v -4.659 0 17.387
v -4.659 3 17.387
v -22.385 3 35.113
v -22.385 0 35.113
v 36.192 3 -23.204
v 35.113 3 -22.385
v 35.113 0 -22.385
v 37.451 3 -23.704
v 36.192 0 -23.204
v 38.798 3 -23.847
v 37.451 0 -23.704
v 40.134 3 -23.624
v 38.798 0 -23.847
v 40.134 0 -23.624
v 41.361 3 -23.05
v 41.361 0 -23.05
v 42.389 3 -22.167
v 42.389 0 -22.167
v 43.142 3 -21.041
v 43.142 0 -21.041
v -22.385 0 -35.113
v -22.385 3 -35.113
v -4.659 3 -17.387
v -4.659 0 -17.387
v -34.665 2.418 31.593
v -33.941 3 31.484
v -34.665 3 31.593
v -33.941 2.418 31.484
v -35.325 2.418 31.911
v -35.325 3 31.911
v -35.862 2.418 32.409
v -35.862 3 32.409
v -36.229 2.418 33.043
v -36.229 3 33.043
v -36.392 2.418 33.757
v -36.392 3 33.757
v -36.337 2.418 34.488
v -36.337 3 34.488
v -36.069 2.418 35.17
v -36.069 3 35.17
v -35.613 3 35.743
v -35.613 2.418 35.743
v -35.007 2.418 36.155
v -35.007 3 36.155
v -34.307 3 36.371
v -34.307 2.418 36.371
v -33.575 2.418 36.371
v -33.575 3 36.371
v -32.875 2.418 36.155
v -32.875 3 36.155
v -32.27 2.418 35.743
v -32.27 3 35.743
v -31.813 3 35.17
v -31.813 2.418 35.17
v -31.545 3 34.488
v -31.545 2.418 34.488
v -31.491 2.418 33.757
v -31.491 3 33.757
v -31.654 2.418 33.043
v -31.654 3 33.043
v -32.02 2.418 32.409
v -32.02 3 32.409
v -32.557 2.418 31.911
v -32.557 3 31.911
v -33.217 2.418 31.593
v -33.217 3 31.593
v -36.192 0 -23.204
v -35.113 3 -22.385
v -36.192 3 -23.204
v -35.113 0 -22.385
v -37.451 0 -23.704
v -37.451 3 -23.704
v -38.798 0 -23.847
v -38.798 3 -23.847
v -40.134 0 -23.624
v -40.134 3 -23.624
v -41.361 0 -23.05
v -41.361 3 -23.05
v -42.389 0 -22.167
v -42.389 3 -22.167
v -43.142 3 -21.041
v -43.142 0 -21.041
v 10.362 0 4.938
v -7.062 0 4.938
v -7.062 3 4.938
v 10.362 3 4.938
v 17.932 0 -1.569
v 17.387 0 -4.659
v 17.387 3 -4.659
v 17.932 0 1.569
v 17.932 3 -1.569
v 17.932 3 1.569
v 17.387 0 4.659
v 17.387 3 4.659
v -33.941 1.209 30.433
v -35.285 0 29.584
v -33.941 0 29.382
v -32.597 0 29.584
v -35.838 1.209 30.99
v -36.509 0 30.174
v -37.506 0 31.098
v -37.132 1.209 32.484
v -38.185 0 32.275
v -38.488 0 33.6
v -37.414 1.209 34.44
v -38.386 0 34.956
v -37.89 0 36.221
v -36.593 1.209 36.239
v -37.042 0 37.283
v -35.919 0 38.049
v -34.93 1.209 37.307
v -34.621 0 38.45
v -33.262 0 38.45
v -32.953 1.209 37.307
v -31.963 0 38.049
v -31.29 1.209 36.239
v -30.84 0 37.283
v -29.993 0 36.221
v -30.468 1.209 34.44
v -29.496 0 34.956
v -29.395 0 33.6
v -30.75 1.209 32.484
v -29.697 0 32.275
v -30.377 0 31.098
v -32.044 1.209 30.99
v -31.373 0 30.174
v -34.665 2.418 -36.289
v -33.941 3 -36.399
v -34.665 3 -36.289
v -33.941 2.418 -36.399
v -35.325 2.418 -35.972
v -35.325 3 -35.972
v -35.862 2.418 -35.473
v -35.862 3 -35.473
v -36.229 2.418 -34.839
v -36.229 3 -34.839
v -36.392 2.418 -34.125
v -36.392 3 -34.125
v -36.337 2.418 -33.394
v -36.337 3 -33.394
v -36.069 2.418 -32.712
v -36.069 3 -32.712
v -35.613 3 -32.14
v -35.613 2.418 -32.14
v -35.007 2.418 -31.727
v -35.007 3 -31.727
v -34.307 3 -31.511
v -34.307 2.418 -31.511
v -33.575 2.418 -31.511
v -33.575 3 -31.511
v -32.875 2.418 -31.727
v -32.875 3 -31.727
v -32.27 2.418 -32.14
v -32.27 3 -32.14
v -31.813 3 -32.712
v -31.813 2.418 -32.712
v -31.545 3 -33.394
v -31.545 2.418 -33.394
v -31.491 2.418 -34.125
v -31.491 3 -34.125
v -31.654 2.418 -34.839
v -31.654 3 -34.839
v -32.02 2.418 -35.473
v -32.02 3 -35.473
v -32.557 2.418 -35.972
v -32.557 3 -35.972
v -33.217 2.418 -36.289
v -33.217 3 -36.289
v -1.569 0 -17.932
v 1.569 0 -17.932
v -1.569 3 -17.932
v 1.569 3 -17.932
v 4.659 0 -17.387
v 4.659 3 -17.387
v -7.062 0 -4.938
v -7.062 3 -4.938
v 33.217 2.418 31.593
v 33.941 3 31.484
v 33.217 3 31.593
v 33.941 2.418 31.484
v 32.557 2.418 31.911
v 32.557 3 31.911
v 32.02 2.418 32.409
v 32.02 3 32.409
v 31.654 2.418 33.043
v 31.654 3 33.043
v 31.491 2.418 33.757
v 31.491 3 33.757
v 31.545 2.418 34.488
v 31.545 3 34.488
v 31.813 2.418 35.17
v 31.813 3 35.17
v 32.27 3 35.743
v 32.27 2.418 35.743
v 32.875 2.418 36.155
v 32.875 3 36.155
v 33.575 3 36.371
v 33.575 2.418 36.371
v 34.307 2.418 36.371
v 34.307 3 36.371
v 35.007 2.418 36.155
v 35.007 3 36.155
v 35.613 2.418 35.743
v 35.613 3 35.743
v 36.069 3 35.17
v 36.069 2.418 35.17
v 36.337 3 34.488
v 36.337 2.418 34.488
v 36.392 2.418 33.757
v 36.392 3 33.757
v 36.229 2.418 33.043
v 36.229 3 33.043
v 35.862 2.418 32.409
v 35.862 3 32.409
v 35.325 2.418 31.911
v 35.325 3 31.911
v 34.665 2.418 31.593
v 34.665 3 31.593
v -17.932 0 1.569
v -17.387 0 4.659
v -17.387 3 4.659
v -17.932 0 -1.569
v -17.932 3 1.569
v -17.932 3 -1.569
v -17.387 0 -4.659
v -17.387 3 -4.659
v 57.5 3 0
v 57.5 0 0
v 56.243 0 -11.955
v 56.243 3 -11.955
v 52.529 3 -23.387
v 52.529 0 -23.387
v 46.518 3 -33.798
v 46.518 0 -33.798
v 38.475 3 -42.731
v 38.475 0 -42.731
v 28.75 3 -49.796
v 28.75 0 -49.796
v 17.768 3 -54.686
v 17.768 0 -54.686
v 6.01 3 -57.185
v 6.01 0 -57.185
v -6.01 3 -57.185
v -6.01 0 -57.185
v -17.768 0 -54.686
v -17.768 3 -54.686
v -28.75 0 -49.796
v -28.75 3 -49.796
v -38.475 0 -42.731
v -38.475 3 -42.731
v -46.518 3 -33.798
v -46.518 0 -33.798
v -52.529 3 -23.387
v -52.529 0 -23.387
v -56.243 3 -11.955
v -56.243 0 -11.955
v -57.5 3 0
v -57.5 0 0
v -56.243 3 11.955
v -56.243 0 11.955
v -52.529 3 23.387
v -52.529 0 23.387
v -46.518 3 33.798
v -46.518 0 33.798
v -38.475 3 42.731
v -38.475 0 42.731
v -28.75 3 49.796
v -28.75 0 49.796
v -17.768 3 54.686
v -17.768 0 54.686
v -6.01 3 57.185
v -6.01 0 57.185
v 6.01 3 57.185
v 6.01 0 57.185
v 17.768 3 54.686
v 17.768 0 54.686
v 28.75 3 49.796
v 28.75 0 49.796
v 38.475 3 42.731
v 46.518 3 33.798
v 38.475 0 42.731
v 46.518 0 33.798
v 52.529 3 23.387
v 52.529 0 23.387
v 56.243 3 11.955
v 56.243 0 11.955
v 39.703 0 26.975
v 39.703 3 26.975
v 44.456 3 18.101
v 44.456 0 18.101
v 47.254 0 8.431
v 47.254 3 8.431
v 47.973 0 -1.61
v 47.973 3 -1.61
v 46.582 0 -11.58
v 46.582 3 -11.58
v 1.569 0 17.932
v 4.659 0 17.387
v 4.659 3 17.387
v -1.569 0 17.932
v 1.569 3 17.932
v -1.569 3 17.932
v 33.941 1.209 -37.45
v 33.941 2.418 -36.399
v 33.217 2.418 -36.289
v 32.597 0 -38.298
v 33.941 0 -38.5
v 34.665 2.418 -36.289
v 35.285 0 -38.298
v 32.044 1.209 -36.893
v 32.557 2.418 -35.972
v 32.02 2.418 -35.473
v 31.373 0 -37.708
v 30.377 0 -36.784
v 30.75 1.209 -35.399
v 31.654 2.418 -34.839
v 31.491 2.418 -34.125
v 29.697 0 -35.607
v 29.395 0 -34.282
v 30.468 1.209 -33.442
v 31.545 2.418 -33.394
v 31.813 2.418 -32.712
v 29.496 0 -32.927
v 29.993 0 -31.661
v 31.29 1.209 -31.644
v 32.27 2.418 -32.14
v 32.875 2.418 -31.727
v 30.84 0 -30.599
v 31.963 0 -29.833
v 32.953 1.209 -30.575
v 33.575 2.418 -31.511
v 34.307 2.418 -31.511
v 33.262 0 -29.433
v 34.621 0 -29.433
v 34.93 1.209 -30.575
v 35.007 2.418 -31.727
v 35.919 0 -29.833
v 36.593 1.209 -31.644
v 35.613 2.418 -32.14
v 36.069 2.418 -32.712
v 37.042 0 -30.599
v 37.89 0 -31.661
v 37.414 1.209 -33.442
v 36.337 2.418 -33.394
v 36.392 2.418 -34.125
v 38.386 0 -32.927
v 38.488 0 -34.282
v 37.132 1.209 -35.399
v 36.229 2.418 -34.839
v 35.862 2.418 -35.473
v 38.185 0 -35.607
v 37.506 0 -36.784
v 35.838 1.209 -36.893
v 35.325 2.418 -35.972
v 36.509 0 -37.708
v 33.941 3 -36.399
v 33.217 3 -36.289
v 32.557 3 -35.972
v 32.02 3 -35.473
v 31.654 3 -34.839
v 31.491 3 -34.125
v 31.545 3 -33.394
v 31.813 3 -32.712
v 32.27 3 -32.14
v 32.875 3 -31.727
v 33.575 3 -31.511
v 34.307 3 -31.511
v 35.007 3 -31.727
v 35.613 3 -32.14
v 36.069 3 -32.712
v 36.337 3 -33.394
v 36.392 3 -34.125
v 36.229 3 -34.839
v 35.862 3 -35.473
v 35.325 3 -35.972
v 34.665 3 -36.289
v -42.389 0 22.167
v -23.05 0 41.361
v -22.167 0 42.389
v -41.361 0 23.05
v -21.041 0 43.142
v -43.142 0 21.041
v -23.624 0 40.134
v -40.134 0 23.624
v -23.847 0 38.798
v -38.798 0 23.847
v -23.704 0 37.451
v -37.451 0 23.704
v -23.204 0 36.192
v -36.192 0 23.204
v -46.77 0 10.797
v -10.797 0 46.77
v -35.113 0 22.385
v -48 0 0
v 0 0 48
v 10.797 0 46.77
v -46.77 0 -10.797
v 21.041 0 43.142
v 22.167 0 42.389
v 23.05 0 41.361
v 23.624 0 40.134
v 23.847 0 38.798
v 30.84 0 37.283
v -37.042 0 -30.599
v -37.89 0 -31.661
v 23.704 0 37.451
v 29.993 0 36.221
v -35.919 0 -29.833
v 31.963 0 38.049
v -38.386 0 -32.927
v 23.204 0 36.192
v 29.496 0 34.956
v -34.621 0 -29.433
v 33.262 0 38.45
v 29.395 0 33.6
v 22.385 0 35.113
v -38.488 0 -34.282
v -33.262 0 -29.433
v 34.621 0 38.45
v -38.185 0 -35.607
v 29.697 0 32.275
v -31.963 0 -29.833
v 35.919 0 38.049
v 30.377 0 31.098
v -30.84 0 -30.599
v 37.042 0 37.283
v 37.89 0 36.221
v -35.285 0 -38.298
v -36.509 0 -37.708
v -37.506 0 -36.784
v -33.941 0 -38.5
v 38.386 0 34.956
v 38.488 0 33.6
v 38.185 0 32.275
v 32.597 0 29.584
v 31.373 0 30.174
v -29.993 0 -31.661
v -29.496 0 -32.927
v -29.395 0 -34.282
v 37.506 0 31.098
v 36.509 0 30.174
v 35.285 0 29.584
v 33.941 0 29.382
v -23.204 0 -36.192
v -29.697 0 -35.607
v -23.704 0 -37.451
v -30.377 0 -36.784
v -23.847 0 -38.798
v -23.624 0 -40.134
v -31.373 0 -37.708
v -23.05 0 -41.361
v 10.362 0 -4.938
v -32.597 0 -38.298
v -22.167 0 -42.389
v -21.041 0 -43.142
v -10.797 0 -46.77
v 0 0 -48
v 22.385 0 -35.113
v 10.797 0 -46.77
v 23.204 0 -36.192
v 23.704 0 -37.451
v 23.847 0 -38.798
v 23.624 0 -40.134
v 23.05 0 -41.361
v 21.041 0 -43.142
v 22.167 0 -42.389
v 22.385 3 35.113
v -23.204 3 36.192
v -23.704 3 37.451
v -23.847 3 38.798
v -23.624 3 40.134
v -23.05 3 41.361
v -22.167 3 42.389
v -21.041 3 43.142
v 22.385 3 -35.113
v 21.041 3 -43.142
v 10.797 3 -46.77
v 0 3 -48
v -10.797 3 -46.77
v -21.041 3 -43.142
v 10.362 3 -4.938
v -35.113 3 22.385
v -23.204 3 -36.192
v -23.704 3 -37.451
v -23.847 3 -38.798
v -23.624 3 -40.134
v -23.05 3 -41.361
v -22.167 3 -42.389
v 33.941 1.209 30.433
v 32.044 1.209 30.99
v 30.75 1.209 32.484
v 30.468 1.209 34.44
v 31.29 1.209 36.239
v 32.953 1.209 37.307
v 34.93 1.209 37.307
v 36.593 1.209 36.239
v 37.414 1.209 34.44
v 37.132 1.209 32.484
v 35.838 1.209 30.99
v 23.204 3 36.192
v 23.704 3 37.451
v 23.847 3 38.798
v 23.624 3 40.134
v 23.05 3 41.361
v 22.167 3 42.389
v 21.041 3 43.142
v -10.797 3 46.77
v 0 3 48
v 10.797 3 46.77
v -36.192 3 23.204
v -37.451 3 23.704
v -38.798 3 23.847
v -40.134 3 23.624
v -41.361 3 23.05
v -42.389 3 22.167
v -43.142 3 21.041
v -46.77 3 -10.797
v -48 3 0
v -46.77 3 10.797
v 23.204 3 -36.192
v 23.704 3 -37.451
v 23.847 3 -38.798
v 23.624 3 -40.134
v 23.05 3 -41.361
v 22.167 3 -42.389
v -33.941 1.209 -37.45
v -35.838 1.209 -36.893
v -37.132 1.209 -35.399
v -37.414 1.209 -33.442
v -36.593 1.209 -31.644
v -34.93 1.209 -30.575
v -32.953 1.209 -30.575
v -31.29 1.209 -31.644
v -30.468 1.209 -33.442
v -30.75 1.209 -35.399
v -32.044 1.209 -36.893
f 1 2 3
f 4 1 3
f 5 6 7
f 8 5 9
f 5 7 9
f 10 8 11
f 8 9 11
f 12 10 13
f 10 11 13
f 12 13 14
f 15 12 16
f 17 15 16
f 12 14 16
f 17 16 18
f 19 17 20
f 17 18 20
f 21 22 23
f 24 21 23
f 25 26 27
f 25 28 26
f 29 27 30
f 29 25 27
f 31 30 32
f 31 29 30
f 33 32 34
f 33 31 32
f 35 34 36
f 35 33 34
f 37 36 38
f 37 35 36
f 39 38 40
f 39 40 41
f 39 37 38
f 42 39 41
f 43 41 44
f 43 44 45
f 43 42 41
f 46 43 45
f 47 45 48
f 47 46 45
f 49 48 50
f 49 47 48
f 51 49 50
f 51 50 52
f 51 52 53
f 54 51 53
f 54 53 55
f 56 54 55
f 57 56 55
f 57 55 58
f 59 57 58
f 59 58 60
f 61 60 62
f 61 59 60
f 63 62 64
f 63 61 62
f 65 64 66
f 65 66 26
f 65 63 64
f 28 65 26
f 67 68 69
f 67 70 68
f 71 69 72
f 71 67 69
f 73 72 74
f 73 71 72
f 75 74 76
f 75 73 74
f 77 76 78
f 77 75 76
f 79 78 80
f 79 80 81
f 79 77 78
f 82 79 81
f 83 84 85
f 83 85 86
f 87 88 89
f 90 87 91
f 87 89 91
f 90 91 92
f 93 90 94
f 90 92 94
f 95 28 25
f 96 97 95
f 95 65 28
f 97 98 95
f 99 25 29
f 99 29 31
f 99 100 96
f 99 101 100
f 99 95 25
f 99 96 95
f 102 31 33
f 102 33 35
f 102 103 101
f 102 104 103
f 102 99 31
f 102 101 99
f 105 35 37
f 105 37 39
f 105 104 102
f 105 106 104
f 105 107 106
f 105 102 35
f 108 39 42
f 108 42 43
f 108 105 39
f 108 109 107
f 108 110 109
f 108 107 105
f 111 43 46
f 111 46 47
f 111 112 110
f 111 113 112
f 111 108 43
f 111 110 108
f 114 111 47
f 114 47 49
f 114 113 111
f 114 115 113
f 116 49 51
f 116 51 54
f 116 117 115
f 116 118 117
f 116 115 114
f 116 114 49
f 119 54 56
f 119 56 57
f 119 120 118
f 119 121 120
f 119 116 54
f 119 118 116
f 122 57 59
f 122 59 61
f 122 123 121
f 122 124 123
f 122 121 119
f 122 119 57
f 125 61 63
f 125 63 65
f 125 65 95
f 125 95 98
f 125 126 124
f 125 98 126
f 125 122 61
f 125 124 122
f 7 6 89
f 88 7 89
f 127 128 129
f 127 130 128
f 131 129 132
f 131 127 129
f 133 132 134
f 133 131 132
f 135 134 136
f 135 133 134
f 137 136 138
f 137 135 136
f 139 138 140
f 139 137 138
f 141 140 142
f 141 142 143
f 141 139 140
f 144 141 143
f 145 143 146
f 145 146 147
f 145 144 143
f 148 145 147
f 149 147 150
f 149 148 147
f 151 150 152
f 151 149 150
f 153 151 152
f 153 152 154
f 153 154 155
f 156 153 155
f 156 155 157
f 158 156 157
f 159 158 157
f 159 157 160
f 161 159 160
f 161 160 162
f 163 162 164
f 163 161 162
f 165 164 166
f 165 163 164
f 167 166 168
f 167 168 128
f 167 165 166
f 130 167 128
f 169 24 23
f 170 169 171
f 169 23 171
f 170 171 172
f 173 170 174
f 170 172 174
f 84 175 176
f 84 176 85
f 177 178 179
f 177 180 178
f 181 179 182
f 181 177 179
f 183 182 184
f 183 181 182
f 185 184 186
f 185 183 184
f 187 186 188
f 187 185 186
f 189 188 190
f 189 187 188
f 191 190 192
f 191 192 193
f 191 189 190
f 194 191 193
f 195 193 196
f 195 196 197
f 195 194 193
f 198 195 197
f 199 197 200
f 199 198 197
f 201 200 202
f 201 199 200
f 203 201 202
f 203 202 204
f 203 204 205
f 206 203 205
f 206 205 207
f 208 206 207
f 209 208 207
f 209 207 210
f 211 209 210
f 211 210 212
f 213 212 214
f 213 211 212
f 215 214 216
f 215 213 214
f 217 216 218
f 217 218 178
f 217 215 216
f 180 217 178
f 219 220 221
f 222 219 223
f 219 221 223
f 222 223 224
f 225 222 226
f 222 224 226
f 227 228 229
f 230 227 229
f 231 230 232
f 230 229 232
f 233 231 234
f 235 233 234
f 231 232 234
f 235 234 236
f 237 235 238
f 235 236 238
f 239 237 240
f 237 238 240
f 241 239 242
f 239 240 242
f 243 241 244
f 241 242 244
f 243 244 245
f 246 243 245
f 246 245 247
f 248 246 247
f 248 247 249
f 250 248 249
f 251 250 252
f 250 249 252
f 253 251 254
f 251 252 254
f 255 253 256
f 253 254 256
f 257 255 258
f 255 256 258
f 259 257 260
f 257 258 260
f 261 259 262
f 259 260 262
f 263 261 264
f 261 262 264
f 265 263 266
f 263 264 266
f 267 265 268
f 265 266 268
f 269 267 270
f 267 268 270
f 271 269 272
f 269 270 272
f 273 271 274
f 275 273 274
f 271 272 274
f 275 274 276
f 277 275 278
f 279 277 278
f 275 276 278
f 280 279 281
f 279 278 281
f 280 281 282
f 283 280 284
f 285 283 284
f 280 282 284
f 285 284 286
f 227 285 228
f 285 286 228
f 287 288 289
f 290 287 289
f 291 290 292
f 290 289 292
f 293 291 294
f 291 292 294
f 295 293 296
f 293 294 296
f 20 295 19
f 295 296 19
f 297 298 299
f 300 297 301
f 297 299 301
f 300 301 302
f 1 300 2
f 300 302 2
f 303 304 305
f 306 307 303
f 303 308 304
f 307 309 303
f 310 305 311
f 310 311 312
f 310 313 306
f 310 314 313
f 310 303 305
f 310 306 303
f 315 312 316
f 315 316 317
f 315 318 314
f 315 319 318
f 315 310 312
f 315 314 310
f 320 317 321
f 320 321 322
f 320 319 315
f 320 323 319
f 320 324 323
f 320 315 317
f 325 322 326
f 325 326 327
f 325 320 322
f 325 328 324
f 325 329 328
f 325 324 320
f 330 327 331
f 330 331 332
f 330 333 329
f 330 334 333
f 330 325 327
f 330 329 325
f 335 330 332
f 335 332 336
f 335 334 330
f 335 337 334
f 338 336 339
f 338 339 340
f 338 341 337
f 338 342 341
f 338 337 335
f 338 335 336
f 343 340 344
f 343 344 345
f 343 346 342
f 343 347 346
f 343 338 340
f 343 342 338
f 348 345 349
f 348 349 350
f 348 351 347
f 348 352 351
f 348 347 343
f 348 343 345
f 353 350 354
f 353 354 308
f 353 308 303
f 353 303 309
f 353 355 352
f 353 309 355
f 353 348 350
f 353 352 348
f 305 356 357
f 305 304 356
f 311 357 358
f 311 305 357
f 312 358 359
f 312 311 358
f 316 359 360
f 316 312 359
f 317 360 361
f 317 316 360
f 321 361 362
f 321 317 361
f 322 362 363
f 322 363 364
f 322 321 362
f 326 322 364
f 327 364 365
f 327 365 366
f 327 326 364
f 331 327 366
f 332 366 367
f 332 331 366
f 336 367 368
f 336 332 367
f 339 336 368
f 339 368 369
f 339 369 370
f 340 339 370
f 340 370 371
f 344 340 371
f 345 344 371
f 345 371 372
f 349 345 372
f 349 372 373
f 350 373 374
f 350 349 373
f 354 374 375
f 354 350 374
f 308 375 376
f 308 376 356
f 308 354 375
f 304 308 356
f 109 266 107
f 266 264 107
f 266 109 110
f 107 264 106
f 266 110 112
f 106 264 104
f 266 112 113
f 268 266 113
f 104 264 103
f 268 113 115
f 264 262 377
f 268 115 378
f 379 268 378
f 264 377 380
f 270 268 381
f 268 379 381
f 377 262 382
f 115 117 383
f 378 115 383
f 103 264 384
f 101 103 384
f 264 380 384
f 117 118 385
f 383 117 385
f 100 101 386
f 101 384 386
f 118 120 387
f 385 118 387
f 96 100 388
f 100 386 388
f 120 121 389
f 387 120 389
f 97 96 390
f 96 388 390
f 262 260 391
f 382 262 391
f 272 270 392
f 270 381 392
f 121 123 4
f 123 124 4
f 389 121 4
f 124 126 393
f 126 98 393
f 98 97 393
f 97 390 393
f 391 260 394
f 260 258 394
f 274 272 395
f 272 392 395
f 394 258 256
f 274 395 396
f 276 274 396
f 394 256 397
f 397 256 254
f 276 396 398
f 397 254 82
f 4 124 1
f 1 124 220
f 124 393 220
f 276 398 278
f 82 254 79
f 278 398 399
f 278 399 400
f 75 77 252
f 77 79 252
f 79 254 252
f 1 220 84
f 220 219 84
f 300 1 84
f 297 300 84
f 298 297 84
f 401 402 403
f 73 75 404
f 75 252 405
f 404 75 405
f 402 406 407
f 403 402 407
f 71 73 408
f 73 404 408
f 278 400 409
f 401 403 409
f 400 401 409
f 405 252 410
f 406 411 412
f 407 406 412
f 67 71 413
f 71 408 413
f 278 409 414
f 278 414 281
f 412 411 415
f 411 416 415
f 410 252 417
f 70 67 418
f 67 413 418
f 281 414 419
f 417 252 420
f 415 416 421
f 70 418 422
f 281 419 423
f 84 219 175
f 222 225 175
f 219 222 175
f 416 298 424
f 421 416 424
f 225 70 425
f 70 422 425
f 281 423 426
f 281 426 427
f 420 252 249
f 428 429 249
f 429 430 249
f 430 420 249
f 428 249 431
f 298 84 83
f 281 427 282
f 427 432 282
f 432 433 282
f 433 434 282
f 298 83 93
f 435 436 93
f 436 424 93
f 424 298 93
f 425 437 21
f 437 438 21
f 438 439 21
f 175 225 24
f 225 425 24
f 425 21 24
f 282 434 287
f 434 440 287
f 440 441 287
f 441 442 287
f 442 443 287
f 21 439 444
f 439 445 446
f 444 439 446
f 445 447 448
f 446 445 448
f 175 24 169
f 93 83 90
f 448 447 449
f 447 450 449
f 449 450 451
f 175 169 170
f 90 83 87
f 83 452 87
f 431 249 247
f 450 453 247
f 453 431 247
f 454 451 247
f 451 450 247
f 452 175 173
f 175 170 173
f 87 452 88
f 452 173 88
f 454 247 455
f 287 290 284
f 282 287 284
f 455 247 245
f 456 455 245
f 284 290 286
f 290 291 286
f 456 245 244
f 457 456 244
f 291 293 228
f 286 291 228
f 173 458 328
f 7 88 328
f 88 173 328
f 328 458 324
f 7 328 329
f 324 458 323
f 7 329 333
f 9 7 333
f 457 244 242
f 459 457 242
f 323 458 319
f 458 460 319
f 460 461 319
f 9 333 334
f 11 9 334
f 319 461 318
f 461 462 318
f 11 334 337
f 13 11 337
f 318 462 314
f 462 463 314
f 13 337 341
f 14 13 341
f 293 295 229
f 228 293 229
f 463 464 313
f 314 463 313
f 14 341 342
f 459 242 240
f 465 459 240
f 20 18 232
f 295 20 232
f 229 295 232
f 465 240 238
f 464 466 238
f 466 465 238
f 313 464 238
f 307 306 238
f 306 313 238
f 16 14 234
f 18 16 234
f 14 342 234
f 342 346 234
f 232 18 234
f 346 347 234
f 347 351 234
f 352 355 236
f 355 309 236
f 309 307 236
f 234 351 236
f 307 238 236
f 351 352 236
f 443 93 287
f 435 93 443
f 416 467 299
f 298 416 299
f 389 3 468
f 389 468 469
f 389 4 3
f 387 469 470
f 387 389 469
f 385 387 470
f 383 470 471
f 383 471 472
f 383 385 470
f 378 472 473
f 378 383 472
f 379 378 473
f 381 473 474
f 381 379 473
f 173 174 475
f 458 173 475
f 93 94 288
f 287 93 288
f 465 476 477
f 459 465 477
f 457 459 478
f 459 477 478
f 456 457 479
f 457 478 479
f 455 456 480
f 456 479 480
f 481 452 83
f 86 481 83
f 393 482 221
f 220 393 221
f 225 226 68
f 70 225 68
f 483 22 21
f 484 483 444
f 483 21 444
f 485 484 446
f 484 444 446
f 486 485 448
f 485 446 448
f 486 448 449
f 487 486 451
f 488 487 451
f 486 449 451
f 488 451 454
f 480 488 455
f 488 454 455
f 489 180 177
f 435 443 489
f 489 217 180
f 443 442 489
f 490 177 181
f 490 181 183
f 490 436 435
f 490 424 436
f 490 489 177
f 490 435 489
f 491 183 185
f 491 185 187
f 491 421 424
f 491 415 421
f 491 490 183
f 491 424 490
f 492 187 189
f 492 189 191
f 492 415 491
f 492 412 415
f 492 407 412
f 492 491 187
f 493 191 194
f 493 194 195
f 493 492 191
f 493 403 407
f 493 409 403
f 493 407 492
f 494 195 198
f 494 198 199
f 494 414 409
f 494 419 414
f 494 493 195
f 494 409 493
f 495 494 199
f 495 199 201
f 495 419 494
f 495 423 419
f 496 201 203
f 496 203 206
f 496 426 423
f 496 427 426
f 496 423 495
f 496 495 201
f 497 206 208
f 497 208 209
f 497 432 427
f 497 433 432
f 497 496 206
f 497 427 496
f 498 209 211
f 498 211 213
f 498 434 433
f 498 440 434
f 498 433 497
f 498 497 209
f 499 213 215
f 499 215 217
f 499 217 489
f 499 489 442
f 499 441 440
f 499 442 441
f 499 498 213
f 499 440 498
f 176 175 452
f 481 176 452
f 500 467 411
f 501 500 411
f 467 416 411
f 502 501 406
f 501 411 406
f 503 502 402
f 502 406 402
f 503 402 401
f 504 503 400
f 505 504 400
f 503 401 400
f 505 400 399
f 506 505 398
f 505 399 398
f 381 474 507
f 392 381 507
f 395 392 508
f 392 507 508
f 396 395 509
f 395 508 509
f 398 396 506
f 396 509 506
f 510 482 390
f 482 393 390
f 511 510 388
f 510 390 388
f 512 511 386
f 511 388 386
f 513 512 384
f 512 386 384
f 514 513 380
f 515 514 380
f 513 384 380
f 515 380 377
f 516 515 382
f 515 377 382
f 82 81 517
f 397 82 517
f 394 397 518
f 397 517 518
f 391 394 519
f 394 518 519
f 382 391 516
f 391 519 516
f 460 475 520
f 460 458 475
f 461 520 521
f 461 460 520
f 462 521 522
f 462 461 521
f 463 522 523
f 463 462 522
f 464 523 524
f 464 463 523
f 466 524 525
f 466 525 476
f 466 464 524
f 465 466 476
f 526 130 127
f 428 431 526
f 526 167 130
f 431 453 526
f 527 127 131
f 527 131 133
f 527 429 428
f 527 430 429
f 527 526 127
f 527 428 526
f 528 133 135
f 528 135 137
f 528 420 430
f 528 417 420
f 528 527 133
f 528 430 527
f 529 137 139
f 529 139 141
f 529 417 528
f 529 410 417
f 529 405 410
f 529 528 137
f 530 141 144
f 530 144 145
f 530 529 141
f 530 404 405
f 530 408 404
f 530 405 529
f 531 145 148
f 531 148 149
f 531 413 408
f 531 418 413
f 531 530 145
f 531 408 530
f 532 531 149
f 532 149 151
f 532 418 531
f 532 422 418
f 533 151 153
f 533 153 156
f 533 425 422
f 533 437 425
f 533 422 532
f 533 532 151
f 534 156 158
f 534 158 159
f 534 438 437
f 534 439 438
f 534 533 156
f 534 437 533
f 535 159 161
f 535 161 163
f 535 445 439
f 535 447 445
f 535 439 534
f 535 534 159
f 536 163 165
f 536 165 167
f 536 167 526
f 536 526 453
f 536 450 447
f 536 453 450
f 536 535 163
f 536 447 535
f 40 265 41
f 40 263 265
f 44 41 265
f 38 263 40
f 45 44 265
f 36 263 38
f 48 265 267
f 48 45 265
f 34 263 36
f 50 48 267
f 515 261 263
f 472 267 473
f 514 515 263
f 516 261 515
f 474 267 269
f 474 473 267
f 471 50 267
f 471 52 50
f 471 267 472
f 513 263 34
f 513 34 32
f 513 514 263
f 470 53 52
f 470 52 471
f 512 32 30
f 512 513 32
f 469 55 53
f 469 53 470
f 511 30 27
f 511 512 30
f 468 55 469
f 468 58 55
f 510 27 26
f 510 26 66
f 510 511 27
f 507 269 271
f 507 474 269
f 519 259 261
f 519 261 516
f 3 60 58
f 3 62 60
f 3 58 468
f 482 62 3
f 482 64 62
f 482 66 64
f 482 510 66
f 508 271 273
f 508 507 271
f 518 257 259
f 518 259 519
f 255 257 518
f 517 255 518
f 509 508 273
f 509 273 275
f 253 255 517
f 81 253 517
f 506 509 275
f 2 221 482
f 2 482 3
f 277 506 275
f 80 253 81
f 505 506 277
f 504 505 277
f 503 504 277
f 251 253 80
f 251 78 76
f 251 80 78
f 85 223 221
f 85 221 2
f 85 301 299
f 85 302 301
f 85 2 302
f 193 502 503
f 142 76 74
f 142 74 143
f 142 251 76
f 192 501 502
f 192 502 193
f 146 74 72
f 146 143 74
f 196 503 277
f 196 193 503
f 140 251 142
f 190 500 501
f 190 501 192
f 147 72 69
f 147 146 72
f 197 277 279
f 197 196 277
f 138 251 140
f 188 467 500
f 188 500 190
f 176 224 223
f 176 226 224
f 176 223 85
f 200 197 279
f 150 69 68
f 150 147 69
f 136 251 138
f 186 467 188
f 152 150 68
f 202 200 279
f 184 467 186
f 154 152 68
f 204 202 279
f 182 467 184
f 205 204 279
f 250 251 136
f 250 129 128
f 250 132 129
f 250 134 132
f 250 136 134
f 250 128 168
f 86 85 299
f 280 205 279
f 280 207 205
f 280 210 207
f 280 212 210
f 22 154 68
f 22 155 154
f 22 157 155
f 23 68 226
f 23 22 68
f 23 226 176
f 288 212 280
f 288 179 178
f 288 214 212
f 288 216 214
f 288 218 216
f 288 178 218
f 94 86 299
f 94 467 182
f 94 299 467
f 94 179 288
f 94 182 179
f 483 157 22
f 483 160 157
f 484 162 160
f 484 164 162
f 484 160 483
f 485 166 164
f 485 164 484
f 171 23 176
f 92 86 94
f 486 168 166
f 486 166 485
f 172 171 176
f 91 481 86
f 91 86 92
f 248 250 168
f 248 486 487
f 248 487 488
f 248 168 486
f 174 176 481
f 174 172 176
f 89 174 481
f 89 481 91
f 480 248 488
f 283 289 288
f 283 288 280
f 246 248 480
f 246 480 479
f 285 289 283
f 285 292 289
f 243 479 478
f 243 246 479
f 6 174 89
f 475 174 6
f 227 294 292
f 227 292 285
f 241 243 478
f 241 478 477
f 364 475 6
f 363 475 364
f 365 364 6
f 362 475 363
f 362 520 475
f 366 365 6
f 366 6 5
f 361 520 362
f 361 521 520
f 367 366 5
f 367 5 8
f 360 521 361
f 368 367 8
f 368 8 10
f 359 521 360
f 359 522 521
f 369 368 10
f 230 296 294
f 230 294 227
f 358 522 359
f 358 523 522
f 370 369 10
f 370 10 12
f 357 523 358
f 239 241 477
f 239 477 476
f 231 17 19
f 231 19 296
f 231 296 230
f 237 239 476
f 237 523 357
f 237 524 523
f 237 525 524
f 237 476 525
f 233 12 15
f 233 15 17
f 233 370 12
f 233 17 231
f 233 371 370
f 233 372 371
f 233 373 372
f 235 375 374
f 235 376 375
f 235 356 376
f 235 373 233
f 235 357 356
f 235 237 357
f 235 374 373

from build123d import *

# Parameters (mm, degrees)
SKETCH1_R                                     = 57.5
SKETCH1_R_2                                   = 0.5
SKETCH1_W                                     = 9.3
SKETCH1_H                                     = 9.875
BOSS_EXTRUDE1_DEPTH                           = 3
CSK_FOR_8_FLAT_HEAD_SOCKET_CAP_SCREW1_A_COUNT = 2
CSK_FOR_8_FLAT_HEAD_SOCKET_CAP_SCREW1_A_PITCH = 67.882250994
CSK_FOR_8_FLAT_HEAD_SOCKET_CAP_SCRE_2_COUNT   = 2
CSK_FOR_8_FLAT_HEAD_SOCKET_CAP_SCRE_2_PITCH   = 96
CSK_FOR_8_FLAT_HEAD_SOCKET_CAP_SCRE_3_COUNT   = 2
CSK_FOR_8_FLAT_HEAD_SOCKET_CAP_SCRE_3_PITCH   = 67.882250994
CUT_EXTRUDE1_DEPTH                            = 4
FILLET1_R                                     = 5
SKETCH5_W                                     = 4.0625
SKETCH5_H                                     = 9.875
CUT_EXTRUDE2_DEPTH                            = 4


with BuildPart() as part:
    # Sketch1 → Boss-Extrude1 (new body)
    with BuildSketch(Plane(origin=(0, 0, 0), x_dir=(1, 0, 0), z_dir=(0, 1, 0))):
        Circle(SKETCH1_R)
        with Locations((-33.941125497, 33.941125497)):
            Circle(SKETCH1_R_2, mode=Mode.SUBTRACT)
        with Locations((33.941125497, 33.941125497)):
            Circle(SKETCH1_R_2, mode=Mode.SUBTRACT)
        with Locations((33.941125497, -33.941125497)):
            Circle(SKETCH1_R_2, mode=Mode.SUBTRACT)
        with Locations((-33.941125497, -33.941125497)):
            Circle(SKETCH1_R_2, mode=Mode.SUBTRACT)
        with Locations((1.65, 0)):
            Rectangle(SKETCH1_W, SKETCH1_H, mode=Mode.SUBTRACT)
    extrude(amount=BOSS_EXTRUDE1_DEPTH)

    # Sketch2 → CSK for #8 Flat Head Socket Cap Screw1 (revolve, cut)
    with BuildSketch(Plane(origin=(-33.941125497, 0, 33.941125497), x_dir=(0, 0, -1), z_dir=(1, 0, 0))):
        Polygon((0, 0), (0, 3), (2.45745, 3), (2.45745, 2.417901837), (4.5593, 0), align=None)
    csk_for_8_flat_head_socket_cap_screw1 = revolve(axis=Axis((-33.941125497, -6.35, 33.941125497), (0, 1, 0)), mode=Mode.SUBTRACT)

    # CSK for #8 Flat Head Socket Cap Screw1 a: CSK for #8 Flat Head Socket Cap Screw1 ×2
    with Locations(*[(i * CSK_FOR_8_FLAT_HEAD_SOCKET_CAP_SCREW1_A_PITCH, 0, 0) for i in range(1, CSK_FOR_8_FLAT_HEAD_SOCKET_CAP_SCREW1_A_COUNT)]):
        add(csk_for_8_flat_head_socket_cap_screw1, mode=Mode.SUBTRACT)

    # CSK for _8 Flat Head Socket Cap Scre 2: CSK for #8 Flat Head Socket Cap Screw1 ×2
    with Locations(*[Vector(0.707106781, 0, -0.707106781) * (i * CSK_FOR_8_FLAT_HEAD_SOCKET_CAP_SCRE_2_PITCH) for i in range(1, CSK_FOR_8_FLAT_HEAD_SOCKET_CAP_SCRE_2_COUNT)]):
        add(csk_for_8_flat_head_socket_cap_screw1, mode=Mode.SUBTRACT)

    # CSK for _8 Flat Head Socket Cap Scre 3: CSK for #8 Flat Head Socket Cap Screw1 ×2
    with Locations(*[(0, 0, -i * CSK_FOR_8_FLAT_HEAD_SOCKET_CAP_SCRE_3_PITCH) for i in range(1, CSK_FOR_8_FLAT_HEAD_SOCKET_CAP_SCRE_3_COUNT)]):
        add(csk_for_8_flat_head_socket_cap_screw1, mode=Mode.SUBTRACT)

    # Sketch4 → Cut-Extrude1 (cut, through all)
    with BuildSketch(Plane(origin=(0, 3, 0), x_dir=(1, 0, 0), z_dir=(0, 1, 0))):
        with BuildLine():
            Line((-26.975205126, 39.703127187), (-4.658742812, 17.386664873))
            ThreePointArc((-4.658742812, 17.386664873), (0, 18), (4.658742812, 17.386664873))
            Line((4.658742812, 17.386664873), (26.975205126, 39.703127187))
            ThreePointArc((26.975205126, 39.703127187), (0, 48), (-26.975205126, 39.703127187))
        make_face()
        with BuildLine():
            Line((39.703127187, 26.975205126), (17.386664873, 4.658742812))
            ThreePointArc((17.386664873, 4.658742812), (18, 0), (17.386664873, -4.658742812))
            Line((17.386664873, -4.658742812), (39.703127187, -26.975205126))
            ThreePointArc((39.703127187, -26.975205126), (48, 0), (39.703127187, 26.975205126))
        make_face()
        with BuildLine():
            Line((26.975205126, -39.703127187), (4.658742812, -17.386664873))
            ThreePointArc((4.658742812, -17.386664873), (0, -18), (-4.658742812, -17.386664873))
            Line((-4.658742812, -17.386664873), (-26.975205126, -39.703127187))
            ThreePointArc((-26.975205126, -39.703127187), (0, -48), (26.975205126, -39.703127187))
        make_face()
        with BuildLine():
            Line((-39.703127187, -26.975205126), (-17.386664873, -4.658742812))
            ThreePointArc((-17.386664873, -4.658742812), (-18, 0), (-17.386664873, 4.658742812))
            Line((-17.386664873, 4.658742812), (-39.703127187, 26.975205126))
            ThreePointArc((-39.703127187, 26.975205126), (-48, 0), (-39.703127187, -26.975205126))
        make_face()
    extrude(amount=-CUT_EXTRUDE1_DEPTH, mode=Mode.SUBTRACT)

    # Fillet1
    fillet1_edges = [part.edges().sort_by_distance(p)[0] for p in [
        (-39.703127187, 1.5, 26.975205126),
        (-39.703127187, 1.5, -26.975205126),
        (-26.975205126, 1.5, -39.703127187),
        (26.975205126, 1.5, -39.703127187),
        (39.703127187, 1.5, -26.975205126),
        (26.975205126, 1.5, 39.703127187),
        (-26.975205126, 1.5, 39.703127187),
    ]]
    fillet(fillet1_edges, radius=FILLET1_R)

    # Sketch5 → Cut-Extrude2 (cut, through all)
    with BuildSketch(Plane.XZ):
        with Locations((8.33125, 0)):
            Rectangle(SKETCH5_W, SKETCH5_H)
        with Locations((-5.03125, 0)):
            Rectangle(SKETCH5_W, SKETCH5_H)
    extrude(amount=-CUT_EXTRUDE2_DEPTH, mode=Mode.SUBTRACT)


solid = part.part
